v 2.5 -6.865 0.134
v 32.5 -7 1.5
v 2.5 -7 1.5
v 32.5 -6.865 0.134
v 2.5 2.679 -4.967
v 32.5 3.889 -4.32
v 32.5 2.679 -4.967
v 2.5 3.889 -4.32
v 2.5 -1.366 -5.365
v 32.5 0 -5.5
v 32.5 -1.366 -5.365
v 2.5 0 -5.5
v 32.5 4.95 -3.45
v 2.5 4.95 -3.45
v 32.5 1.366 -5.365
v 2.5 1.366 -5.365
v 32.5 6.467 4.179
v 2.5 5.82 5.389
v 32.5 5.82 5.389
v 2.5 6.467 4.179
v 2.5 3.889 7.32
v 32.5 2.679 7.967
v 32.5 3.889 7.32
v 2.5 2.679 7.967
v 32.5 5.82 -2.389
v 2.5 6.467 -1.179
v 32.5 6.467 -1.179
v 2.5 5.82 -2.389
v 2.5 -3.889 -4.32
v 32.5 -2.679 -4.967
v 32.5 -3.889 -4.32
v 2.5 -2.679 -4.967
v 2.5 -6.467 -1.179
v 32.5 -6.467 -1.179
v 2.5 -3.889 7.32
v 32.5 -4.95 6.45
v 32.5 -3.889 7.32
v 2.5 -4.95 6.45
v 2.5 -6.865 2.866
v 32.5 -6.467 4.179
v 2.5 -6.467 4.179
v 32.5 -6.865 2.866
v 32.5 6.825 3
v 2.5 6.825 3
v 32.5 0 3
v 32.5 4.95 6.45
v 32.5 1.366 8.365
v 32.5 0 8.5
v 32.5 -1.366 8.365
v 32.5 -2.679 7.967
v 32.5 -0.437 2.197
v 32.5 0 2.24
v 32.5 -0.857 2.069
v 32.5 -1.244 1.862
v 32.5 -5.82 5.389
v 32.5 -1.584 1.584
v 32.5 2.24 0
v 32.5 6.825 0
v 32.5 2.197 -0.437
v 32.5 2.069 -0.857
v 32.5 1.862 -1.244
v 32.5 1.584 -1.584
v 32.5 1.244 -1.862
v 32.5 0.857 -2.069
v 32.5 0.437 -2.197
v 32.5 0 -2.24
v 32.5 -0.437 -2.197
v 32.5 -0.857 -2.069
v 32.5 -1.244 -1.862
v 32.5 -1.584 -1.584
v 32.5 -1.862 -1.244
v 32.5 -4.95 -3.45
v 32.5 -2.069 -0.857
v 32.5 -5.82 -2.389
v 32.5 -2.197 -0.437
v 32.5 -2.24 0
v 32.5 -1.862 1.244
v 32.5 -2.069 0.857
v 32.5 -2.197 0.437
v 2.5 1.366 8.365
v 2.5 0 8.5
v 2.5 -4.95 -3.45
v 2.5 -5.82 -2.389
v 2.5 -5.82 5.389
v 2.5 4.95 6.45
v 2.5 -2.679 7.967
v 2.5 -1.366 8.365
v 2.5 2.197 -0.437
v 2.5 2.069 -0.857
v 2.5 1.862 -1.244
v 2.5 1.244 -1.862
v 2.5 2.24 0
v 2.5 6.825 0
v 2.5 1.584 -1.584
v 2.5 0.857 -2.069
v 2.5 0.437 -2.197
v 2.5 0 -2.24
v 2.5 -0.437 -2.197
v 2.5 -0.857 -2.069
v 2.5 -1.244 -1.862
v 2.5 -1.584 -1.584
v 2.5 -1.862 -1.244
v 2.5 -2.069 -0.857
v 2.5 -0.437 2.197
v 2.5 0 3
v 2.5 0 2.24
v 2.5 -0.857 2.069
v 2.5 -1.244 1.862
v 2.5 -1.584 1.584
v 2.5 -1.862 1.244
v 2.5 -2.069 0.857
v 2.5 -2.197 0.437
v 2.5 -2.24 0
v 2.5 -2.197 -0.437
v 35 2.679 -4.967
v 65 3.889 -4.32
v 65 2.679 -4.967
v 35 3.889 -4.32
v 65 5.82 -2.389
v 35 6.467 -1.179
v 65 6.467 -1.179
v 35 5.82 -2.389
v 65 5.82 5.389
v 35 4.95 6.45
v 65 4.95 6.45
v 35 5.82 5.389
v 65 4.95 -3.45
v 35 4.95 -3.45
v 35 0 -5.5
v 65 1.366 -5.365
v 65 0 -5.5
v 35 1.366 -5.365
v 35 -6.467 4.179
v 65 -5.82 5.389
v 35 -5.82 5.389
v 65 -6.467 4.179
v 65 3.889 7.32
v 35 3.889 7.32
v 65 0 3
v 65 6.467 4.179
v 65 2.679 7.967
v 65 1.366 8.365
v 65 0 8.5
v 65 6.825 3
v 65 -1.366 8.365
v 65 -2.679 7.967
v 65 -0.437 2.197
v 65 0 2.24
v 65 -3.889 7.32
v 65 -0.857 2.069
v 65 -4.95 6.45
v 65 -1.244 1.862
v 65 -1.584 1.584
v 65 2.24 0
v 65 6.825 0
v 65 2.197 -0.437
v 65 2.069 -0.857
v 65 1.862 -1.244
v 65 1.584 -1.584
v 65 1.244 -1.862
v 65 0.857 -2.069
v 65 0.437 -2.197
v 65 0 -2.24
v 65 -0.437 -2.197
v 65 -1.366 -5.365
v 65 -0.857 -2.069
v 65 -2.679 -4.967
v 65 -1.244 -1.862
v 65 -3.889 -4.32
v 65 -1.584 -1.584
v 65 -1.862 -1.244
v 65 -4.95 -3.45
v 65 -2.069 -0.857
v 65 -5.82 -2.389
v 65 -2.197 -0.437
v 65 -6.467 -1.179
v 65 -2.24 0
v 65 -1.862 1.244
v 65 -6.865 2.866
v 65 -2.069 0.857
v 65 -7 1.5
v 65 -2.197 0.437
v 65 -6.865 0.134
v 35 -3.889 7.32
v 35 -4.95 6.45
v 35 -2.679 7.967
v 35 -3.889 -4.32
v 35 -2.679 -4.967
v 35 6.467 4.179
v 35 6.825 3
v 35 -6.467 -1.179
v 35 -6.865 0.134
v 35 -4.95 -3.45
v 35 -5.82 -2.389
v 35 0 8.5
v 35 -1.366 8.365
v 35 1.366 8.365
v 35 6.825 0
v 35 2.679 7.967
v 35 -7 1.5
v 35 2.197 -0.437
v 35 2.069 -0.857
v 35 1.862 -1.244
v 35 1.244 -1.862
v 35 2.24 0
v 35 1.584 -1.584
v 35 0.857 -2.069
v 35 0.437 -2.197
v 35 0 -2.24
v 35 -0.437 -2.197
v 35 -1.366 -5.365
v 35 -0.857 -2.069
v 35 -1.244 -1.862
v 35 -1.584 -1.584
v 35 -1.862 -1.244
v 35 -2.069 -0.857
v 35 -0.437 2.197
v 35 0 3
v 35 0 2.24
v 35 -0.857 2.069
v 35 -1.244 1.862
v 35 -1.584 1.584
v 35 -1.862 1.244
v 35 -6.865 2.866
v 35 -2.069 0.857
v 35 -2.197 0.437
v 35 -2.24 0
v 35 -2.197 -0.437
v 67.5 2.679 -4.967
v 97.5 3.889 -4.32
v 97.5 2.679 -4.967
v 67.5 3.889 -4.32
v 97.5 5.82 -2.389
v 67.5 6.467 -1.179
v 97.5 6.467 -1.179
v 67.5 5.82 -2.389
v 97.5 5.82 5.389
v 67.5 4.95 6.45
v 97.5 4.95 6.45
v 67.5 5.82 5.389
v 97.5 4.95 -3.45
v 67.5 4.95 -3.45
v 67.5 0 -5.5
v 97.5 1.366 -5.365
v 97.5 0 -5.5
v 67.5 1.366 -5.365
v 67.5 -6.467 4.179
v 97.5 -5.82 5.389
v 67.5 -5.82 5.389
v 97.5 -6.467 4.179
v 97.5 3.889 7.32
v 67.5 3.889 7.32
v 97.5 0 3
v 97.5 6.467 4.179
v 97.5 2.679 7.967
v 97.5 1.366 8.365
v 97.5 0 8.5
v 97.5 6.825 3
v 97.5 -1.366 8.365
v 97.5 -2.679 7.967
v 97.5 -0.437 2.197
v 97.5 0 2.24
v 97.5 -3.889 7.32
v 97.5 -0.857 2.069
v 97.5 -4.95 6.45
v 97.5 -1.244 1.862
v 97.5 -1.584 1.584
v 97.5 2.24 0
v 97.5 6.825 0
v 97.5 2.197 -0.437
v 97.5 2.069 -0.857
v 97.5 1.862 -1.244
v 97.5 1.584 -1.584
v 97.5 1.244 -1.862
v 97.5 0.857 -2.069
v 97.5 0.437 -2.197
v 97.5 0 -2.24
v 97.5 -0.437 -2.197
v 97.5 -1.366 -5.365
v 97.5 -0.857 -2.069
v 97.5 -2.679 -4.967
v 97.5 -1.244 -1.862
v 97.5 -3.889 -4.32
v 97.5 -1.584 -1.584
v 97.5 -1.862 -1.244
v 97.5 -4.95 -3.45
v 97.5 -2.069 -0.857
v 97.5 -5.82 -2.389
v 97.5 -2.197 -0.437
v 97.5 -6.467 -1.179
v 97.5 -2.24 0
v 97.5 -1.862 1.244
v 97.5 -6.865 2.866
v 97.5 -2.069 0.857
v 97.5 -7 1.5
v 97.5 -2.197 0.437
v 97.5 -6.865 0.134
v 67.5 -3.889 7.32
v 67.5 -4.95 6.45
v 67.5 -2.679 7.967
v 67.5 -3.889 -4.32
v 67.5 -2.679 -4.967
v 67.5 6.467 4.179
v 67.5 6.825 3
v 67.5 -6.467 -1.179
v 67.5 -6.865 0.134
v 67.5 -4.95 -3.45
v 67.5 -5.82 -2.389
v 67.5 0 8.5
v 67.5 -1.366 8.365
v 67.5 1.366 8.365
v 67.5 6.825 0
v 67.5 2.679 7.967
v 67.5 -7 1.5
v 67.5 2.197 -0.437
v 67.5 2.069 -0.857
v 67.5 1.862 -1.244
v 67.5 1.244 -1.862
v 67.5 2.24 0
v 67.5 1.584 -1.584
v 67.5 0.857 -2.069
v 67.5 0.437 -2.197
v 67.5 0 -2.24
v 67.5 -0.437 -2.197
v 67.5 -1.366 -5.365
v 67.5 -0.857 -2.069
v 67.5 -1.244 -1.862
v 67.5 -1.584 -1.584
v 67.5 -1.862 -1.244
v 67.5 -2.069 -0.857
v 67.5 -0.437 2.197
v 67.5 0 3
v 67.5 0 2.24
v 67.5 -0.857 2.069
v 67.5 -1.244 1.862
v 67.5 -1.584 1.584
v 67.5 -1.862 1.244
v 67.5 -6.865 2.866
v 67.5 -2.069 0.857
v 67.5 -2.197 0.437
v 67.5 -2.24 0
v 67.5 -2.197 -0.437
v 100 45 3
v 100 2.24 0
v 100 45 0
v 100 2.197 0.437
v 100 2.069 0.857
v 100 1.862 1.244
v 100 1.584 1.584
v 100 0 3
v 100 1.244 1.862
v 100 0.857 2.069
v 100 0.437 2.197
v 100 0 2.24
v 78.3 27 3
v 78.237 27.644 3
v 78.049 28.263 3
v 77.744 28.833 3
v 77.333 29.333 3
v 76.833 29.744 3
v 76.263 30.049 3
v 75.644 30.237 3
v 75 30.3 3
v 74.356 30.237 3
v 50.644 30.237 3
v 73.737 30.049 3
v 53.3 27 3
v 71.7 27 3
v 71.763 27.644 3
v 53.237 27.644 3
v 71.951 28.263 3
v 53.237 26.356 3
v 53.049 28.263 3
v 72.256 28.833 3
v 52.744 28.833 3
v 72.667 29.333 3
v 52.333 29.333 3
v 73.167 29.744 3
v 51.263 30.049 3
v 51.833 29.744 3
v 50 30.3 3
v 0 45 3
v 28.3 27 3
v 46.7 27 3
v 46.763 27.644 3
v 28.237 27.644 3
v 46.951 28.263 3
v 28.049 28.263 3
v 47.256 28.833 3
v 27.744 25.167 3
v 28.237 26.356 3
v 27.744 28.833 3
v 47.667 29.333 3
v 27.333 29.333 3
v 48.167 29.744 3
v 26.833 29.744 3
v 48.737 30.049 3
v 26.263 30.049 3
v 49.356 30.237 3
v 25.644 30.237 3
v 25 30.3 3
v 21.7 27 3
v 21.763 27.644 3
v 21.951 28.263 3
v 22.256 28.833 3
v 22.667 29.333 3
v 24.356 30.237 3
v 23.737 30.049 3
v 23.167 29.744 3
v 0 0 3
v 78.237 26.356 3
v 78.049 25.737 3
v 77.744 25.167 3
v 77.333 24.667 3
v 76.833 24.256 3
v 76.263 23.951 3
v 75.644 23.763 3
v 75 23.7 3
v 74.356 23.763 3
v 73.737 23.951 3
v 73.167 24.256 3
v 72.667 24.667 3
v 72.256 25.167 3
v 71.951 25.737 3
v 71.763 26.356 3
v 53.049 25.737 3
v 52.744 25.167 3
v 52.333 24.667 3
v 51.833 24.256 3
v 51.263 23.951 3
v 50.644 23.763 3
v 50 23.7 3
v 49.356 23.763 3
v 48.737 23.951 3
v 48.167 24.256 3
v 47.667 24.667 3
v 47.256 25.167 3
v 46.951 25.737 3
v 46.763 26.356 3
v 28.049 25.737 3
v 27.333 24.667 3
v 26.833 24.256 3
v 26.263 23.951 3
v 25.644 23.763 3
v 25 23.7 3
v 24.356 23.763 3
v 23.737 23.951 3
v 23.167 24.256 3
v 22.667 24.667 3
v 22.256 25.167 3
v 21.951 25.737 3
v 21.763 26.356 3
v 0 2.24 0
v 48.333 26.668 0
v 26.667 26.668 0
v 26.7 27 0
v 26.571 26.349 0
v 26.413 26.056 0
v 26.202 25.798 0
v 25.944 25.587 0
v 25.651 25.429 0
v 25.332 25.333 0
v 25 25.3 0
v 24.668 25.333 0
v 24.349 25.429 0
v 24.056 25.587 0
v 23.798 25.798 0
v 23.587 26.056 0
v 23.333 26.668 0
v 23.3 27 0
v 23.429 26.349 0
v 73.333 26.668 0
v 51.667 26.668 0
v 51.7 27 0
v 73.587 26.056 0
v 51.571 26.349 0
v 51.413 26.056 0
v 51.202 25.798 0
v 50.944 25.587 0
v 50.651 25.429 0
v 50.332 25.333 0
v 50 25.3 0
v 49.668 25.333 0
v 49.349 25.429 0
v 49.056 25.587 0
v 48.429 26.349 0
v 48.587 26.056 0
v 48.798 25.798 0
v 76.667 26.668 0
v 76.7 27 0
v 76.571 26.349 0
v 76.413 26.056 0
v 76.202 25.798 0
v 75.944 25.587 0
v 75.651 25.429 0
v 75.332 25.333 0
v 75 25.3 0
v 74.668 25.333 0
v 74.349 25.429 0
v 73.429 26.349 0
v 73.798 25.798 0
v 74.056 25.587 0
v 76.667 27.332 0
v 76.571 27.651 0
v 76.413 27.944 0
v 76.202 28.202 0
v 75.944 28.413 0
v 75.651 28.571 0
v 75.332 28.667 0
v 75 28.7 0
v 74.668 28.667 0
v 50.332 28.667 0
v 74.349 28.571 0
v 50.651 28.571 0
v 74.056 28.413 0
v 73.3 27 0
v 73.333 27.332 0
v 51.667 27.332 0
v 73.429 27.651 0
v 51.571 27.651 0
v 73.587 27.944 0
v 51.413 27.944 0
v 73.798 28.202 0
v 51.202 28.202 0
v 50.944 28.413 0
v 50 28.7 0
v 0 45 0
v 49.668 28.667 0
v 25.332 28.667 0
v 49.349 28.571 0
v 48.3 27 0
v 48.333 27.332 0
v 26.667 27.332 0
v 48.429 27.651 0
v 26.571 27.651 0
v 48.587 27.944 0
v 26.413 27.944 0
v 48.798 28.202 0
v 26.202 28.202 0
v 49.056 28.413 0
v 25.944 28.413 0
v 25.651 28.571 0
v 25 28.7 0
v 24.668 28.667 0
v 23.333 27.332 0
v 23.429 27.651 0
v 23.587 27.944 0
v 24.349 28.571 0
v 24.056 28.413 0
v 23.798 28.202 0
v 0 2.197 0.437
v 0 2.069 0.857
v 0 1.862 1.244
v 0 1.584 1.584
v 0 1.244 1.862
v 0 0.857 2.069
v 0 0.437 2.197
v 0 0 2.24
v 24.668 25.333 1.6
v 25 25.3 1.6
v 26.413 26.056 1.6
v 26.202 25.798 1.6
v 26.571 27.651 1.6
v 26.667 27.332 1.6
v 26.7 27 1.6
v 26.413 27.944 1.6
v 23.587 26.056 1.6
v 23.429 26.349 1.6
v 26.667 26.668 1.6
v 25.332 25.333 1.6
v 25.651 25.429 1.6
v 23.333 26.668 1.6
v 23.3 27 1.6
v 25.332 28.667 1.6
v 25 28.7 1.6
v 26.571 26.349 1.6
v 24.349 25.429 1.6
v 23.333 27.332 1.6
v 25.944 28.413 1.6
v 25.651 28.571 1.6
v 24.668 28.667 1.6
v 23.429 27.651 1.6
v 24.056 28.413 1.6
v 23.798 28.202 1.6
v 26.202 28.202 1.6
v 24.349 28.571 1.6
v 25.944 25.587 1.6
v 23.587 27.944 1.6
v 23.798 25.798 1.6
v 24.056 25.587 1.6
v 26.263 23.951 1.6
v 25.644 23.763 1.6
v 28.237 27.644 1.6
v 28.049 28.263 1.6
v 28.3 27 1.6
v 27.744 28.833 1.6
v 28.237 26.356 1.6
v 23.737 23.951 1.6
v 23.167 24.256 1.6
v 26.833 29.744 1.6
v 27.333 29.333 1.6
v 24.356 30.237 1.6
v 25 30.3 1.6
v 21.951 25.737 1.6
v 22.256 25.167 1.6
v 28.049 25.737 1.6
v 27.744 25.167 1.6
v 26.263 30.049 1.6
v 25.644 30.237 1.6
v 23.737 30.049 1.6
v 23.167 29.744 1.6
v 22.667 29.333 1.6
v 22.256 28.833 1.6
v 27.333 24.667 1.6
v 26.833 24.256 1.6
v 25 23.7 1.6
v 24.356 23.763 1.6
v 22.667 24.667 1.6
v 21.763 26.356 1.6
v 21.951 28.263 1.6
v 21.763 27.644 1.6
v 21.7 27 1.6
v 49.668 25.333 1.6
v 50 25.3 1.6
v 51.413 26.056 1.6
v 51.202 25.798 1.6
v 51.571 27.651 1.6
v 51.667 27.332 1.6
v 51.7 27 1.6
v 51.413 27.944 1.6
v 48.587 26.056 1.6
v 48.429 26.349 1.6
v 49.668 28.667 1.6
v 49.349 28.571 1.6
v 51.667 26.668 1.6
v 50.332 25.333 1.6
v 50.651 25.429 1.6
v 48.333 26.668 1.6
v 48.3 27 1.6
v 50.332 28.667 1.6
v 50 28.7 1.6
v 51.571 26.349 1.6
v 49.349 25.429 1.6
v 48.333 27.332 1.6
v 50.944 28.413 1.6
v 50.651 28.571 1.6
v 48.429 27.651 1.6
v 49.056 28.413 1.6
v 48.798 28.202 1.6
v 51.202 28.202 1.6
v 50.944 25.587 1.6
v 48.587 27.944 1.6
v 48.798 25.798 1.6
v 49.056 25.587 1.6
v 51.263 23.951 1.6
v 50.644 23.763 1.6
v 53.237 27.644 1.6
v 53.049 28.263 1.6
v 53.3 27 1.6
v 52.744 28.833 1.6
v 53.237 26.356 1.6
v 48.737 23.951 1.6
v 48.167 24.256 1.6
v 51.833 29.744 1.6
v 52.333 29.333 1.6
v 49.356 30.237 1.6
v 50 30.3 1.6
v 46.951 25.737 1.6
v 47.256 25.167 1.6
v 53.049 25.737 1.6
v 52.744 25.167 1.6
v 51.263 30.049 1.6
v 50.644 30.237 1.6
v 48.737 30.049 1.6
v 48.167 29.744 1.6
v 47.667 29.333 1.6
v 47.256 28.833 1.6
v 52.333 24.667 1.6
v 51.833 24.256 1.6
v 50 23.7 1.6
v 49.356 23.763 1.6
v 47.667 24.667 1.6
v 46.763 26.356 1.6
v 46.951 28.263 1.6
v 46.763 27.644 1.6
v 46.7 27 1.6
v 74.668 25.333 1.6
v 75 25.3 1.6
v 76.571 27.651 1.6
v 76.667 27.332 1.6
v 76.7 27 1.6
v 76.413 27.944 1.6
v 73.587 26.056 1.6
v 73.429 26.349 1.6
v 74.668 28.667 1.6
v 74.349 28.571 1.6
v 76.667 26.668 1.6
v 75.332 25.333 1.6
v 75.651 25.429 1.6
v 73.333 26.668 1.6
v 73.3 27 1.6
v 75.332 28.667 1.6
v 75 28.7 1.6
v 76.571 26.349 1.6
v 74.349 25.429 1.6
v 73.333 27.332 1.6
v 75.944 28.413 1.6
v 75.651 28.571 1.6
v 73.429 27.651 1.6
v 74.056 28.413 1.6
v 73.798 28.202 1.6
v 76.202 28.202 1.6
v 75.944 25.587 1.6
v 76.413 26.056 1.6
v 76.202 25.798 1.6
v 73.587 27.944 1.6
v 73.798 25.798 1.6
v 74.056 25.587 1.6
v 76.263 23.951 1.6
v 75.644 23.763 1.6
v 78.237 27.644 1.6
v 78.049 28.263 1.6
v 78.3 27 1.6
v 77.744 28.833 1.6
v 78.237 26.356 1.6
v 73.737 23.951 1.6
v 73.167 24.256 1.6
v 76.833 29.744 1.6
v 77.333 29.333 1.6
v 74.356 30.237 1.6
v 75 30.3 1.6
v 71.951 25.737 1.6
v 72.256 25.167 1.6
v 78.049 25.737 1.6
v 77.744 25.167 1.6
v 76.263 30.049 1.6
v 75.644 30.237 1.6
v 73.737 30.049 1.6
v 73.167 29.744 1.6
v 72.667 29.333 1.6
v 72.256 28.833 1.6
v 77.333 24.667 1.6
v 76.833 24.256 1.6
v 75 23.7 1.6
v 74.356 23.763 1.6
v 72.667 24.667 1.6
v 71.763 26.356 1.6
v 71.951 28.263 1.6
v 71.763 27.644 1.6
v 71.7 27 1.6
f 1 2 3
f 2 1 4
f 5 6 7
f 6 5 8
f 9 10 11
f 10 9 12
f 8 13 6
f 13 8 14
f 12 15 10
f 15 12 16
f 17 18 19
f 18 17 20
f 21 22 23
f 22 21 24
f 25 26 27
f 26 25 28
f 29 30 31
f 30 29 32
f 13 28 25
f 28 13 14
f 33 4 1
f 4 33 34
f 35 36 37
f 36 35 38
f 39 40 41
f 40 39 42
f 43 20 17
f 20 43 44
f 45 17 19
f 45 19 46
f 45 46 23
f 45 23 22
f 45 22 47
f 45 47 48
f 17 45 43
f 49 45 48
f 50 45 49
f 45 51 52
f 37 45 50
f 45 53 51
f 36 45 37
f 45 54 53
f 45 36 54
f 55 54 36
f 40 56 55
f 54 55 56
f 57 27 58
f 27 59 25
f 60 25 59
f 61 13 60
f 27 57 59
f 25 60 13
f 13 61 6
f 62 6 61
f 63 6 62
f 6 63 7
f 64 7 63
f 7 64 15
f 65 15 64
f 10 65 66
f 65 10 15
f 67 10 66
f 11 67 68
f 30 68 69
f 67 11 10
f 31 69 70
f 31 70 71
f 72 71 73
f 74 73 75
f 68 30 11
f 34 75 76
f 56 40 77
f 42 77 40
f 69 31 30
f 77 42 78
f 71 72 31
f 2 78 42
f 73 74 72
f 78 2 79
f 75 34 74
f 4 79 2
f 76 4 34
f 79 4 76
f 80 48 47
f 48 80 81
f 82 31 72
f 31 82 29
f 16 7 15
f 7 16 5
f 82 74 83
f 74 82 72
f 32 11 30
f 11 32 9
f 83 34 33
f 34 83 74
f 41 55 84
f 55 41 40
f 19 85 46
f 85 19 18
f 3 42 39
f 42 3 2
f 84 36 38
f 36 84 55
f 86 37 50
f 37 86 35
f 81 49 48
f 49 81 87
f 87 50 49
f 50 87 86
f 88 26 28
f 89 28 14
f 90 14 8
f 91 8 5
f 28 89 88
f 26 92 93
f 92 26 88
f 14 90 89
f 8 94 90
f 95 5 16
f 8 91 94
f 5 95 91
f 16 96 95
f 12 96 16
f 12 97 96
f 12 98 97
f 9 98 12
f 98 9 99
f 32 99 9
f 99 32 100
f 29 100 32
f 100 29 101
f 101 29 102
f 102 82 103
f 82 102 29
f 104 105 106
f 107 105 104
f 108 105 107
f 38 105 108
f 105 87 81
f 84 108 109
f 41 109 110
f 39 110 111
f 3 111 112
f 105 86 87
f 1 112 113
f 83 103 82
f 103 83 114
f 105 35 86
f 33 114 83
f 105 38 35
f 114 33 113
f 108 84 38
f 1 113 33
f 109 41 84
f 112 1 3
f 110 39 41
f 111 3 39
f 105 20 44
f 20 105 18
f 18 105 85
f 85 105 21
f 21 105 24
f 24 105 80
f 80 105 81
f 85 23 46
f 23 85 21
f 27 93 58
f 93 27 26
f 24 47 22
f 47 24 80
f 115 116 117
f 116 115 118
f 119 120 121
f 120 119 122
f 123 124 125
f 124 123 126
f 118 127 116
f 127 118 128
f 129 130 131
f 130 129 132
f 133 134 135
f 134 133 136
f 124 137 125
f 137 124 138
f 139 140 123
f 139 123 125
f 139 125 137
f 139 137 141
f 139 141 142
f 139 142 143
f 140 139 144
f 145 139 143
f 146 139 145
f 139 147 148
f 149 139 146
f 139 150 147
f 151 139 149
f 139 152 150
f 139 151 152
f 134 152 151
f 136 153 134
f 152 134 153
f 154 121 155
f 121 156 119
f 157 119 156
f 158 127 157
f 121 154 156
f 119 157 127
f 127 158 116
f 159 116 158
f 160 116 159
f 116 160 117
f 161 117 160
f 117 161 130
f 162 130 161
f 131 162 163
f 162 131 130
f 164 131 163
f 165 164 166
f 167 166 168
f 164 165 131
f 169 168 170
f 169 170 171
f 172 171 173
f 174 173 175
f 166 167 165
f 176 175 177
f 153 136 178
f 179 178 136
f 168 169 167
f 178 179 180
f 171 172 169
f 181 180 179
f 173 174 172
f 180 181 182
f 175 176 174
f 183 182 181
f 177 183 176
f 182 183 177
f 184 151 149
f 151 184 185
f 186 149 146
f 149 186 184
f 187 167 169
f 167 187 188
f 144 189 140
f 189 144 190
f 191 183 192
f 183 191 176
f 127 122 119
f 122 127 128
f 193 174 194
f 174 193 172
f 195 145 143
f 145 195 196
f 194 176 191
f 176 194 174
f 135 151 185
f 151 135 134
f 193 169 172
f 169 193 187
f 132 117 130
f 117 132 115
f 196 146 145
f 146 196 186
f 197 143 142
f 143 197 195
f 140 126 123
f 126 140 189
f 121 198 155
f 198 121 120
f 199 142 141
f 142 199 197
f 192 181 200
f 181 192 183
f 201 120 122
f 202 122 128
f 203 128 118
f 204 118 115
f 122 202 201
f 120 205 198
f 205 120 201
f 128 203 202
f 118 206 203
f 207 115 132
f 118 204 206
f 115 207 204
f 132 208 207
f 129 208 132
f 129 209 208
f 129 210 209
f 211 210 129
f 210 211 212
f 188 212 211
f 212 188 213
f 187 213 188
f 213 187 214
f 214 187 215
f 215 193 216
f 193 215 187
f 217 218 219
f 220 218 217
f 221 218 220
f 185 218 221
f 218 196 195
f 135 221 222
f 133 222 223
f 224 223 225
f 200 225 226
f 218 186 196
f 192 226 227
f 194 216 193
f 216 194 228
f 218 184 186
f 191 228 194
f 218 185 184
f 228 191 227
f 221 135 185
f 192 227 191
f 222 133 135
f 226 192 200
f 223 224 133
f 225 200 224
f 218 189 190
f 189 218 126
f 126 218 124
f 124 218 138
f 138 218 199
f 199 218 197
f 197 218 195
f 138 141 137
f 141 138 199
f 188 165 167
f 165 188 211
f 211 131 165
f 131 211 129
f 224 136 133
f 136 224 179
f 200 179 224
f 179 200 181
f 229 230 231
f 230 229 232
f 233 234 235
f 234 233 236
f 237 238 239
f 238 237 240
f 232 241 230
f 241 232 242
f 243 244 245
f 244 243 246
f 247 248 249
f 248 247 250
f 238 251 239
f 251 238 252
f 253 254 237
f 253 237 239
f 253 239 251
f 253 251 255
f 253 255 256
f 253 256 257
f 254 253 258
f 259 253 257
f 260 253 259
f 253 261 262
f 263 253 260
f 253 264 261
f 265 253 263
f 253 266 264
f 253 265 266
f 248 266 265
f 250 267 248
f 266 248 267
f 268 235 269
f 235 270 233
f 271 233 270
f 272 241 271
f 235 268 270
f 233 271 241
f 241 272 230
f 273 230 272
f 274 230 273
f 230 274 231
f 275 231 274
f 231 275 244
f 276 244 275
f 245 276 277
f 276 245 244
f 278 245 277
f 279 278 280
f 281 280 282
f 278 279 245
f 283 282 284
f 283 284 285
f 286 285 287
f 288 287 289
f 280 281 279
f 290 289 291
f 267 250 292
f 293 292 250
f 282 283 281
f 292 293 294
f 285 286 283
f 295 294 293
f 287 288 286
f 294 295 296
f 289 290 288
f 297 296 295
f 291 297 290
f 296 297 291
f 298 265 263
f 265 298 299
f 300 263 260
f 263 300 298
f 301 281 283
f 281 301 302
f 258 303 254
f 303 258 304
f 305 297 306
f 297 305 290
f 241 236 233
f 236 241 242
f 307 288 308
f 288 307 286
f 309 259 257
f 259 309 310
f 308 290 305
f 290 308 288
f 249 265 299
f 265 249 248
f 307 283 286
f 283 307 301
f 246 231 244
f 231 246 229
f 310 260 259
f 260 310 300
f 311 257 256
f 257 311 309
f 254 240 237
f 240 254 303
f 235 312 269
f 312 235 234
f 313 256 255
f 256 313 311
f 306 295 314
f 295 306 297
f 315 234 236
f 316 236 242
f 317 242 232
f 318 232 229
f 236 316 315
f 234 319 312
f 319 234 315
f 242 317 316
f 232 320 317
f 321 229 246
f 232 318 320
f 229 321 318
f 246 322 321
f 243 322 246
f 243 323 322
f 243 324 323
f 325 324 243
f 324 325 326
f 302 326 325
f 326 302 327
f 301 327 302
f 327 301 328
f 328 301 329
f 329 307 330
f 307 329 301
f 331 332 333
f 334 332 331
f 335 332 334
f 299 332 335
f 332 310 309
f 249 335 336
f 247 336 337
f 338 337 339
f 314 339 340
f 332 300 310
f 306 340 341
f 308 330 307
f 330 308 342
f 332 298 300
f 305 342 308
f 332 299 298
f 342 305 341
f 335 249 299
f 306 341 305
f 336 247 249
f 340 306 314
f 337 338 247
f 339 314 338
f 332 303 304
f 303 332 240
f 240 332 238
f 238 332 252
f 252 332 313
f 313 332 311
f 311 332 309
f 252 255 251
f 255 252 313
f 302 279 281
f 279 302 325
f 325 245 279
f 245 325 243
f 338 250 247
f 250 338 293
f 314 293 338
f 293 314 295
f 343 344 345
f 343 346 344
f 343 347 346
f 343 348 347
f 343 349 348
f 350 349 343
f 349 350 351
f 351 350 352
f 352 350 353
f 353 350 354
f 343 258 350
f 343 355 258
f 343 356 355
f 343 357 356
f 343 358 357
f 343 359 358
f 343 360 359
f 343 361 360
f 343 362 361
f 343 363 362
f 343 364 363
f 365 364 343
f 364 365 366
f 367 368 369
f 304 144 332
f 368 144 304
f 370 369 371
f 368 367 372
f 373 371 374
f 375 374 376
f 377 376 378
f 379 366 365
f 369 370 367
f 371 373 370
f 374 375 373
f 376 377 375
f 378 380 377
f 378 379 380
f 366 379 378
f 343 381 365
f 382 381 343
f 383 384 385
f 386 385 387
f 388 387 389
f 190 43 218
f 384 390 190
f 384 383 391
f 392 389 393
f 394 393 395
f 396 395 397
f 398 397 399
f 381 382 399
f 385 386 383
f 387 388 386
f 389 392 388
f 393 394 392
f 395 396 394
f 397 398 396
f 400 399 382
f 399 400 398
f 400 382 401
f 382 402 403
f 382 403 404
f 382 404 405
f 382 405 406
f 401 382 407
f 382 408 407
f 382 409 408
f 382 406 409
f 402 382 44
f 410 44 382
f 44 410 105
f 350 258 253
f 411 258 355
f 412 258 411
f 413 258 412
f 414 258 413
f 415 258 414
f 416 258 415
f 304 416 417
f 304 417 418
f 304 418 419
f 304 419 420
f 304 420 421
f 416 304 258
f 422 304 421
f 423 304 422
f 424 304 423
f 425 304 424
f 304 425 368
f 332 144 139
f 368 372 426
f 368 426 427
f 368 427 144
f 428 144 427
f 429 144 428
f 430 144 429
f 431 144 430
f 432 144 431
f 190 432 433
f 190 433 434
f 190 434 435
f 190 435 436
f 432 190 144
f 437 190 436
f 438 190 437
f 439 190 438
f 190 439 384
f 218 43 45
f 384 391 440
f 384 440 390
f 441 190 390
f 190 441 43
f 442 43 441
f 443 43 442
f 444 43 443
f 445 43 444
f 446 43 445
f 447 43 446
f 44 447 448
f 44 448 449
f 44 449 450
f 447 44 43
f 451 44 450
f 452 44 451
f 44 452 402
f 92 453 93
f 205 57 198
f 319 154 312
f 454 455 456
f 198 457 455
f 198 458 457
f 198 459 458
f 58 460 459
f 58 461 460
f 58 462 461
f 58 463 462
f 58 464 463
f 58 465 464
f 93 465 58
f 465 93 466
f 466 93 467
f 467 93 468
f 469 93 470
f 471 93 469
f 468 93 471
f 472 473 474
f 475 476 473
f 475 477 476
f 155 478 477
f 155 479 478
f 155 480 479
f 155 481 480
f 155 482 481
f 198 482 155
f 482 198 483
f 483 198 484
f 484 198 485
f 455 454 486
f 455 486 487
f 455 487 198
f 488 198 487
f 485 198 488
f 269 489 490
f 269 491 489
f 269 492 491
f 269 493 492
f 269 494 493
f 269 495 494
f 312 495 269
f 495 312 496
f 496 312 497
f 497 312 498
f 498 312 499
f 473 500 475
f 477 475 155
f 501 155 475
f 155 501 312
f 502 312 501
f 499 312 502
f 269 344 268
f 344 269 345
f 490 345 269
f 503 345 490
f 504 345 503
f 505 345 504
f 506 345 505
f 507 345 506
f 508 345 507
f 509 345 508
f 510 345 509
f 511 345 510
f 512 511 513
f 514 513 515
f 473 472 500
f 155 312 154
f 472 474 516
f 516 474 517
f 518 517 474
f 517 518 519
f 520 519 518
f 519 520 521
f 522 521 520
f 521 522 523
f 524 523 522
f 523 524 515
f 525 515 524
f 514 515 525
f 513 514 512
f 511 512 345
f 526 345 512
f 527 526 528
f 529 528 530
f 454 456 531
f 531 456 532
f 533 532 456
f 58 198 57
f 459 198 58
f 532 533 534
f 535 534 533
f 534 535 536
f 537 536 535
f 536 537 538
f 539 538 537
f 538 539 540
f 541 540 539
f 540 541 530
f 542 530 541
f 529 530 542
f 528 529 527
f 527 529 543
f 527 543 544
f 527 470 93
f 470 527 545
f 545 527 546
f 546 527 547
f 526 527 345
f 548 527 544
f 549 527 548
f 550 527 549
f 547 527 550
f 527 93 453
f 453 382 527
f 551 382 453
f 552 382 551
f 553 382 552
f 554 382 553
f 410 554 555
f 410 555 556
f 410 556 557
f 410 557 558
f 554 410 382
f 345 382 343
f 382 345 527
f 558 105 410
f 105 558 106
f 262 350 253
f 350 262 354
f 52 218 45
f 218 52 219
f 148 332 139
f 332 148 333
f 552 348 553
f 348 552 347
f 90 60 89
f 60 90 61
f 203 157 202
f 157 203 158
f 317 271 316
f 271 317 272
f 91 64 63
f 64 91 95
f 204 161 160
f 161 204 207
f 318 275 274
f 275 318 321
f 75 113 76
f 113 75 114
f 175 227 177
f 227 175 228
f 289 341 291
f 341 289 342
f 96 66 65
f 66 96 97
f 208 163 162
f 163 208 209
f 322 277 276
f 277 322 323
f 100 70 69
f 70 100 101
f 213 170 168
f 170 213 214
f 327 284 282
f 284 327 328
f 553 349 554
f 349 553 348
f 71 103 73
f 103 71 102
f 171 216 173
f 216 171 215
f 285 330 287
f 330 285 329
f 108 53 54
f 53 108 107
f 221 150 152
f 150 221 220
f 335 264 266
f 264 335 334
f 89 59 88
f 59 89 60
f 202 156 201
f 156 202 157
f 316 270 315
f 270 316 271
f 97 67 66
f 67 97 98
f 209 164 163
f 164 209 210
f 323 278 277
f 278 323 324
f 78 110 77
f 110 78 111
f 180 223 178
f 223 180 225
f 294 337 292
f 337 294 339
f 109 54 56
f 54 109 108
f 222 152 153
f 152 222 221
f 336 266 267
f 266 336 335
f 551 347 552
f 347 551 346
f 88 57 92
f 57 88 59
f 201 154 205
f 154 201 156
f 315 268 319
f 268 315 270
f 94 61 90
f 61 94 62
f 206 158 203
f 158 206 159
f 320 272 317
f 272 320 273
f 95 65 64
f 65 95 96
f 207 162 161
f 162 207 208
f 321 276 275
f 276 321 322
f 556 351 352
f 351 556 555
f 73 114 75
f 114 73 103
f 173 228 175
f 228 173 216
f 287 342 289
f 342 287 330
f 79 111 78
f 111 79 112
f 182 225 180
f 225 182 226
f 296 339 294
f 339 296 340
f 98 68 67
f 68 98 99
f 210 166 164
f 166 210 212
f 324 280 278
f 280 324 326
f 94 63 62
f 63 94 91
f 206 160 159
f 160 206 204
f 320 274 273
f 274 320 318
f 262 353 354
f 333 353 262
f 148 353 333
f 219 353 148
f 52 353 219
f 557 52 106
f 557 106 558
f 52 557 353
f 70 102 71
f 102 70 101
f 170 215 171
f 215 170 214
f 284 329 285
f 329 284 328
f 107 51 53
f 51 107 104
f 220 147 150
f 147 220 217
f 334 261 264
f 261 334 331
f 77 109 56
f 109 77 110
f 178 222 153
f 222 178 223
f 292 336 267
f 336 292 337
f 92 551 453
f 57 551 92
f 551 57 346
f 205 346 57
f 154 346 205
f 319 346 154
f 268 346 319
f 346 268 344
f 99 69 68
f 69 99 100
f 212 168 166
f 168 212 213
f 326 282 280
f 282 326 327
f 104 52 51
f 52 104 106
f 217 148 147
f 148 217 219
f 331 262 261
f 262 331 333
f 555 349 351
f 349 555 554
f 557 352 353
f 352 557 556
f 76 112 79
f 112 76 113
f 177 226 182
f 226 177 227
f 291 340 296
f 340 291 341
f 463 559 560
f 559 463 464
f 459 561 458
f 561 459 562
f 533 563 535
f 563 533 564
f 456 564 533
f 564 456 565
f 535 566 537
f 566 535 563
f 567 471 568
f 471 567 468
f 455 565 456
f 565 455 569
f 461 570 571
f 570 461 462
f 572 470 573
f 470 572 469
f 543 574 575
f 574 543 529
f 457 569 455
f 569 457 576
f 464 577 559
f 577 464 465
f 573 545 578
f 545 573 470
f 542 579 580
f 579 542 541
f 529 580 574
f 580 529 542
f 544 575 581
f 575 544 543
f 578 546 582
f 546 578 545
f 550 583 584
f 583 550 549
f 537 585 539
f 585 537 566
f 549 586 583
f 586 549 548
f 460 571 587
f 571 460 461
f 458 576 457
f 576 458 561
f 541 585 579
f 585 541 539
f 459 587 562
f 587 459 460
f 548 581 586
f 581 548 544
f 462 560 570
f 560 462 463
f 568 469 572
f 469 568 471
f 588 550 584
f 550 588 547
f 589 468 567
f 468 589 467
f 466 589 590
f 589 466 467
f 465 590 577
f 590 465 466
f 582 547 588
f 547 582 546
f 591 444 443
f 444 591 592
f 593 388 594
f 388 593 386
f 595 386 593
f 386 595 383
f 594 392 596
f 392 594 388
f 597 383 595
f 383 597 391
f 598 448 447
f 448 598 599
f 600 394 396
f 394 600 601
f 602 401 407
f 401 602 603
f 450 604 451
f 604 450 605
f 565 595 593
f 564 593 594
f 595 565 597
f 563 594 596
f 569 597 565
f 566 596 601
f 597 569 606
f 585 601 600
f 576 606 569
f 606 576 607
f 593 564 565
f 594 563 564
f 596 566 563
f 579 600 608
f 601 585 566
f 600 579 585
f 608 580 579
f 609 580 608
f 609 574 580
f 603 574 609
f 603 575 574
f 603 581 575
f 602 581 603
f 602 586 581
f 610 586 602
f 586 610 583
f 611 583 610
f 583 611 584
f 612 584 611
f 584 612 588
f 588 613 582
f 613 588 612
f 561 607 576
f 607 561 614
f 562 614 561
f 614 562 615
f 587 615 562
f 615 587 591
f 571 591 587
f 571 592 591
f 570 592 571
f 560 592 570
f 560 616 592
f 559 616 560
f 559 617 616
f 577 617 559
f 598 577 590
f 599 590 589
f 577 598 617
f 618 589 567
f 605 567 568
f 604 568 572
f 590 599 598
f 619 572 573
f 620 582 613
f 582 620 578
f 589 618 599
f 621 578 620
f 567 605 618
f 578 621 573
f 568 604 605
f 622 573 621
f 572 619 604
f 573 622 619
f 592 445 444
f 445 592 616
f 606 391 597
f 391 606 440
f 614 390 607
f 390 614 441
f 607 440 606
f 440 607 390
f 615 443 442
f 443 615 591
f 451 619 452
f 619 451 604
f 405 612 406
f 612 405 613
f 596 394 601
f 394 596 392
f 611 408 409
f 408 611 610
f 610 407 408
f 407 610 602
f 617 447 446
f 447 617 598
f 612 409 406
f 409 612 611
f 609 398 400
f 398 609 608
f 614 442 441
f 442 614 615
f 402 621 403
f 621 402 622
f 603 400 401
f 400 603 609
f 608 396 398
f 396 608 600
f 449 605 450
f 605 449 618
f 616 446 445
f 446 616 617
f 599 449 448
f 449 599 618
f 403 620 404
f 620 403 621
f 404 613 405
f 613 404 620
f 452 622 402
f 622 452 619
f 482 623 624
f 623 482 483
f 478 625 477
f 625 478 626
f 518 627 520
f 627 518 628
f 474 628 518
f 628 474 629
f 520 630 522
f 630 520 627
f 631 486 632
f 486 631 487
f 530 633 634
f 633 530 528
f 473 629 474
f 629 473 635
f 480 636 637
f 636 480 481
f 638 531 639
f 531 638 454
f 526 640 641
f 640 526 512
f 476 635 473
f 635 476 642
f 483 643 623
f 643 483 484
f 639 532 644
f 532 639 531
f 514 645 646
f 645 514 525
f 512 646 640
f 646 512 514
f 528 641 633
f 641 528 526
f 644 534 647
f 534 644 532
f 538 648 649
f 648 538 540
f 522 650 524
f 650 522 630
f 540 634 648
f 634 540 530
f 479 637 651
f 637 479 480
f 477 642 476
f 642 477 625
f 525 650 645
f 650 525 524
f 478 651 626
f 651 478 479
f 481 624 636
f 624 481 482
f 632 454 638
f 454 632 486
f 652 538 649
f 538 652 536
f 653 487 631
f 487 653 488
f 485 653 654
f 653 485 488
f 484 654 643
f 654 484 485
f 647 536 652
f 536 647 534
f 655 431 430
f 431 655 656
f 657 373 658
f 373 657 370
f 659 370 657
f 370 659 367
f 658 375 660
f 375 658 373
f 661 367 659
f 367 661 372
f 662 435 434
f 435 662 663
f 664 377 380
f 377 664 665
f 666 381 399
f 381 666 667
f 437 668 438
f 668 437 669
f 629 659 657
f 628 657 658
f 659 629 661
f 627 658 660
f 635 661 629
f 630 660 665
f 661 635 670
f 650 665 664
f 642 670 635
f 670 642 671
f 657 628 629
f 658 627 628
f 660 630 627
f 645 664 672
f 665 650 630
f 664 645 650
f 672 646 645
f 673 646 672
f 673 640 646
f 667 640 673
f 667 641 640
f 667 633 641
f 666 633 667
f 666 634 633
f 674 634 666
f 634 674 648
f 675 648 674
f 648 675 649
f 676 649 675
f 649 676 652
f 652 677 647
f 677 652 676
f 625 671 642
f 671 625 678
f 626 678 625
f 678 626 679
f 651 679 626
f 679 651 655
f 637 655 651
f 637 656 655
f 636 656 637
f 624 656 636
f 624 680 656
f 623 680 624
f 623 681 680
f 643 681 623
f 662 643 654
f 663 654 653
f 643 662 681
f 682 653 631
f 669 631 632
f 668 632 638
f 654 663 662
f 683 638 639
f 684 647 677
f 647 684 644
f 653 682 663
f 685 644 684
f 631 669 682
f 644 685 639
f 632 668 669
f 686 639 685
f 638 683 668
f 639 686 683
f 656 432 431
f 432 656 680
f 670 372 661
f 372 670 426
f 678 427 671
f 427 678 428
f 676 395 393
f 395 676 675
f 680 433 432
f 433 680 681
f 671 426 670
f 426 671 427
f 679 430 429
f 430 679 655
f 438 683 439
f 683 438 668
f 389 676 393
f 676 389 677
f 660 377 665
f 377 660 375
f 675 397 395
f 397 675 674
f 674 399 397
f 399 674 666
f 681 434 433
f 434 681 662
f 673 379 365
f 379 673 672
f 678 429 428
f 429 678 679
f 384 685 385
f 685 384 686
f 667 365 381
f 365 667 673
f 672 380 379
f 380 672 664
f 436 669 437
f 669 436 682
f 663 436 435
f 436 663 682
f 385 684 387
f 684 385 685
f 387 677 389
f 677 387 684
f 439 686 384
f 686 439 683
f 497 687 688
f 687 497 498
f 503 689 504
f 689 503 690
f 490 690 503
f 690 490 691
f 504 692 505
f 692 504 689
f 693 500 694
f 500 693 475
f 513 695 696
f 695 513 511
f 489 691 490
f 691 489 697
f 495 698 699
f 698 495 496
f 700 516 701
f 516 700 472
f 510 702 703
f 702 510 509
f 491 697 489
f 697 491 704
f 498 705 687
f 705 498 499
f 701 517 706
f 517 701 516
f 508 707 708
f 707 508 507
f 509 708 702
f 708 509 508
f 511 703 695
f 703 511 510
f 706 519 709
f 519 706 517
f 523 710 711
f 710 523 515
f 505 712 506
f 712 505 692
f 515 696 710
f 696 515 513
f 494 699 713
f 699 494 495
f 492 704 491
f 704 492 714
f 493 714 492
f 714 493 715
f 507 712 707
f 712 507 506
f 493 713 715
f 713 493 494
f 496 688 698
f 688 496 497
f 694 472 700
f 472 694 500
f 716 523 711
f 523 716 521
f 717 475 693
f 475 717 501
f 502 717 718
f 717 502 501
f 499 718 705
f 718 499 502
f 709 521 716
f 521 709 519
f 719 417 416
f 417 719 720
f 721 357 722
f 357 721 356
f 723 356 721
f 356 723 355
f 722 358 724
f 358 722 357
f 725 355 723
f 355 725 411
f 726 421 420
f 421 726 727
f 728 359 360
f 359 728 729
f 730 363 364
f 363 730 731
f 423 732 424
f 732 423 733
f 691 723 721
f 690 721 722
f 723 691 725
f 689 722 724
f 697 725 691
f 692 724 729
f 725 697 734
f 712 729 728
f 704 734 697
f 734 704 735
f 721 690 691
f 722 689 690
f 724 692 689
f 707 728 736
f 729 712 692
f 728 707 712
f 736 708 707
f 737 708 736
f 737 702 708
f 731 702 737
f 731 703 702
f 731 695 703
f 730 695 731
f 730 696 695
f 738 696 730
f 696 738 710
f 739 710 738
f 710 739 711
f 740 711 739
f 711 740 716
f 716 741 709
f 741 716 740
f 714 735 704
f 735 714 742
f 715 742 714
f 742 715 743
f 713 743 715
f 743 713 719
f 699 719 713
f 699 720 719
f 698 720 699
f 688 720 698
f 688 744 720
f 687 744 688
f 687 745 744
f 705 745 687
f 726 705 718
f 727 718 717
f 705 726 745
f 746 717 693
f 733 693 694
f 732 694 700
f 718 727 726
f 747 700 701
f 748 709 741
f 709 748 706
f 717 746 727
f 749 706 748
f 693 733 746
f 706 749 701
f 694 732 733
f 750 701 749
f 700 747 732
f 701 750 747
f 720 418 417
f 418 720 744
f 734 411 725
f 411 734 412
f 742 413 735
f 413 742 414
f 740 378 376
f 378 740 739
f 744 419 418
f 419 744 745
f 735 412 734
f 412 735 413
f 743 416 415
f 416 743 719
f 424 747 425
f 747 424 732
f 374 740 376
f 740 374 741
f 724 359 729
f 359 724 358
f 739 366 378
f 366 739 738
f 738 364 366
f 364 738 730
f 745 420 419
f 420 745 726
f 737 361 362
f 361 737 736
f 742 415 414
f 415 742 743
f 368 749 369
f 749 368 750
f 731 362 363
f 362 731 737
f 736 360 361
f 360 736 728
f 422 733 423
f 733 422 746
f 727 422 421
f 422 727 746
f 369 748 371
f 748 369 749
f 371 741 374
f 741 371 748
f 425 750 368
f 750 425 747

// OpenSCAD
$fn = 32;

// ----------------------------------------------------------------------
// Hinge leaf: 100 x 52 x 14 mm
// ----------------------------------------------------------------------

// --- parameters (mm) ---
tab_len = 100;            // leaf length, X
tab_w = 45;               // leaf width, Y
tab_t = 3;                // leaf thickness
ring_d = 14;              // knuckle diameter
ring_w = 30;              // knuckle width
knuckle_n = 3;            // number of knuckles
pin_d = 4.48;             // pin bore
gap = 2.5;                // gap between the knuckles
screw_d = 3.4;            // screw clearance
cs_d = 6.6;               // countersink diameter
cs_h = 1.4;               // countersink depth

module leaf() {
  cube([tab_len, tab_w, tab_t]);
}

module knuckles() {
  /* barrels sit on the leaf edge, the pin axis at half the leaf thickness */
  for (i = [0 : knuckle_n - 1])
    translate([gap + i * (ring_w + gap), 0, tab_t * 0.5])
      rotate([0, 90, 0]) cylinder(h = ring_w, d = ring_d);
}

difference() {
  union() {
    leaf();
    knuckles();
  }
  rotate([0, 90, 0]) translate([0, 0, -1])
    cylinder(h = tab_len + 2, d = pin_d);
  translate([25, tab_w * 0.6, -1]) cylinder(h = tab_t + 2, d = screw_d);
  translate([25, tab_w * 0.6, tab_t - cs_h]) cylinder(h = cs_h + 0.5, d = cs_d);
  translate([50, tab_w * 0.6, -1]) cylinder(h = tab_t + 2, d = screw_d);
  translate([50, tab_w * 0.6, tab_t - cs_h]) cylinder(h = cs_h + 0.5, d = cs_d);
  translate([75, tab_w * 0.6, -1]) cylinder(h = tab_t + 2, d = screw_d);
  translate([75, tab_w * 0.6, tab_t - cs_h]) cylinder(h = cs_h + 0.5, d = cs_d);
}
